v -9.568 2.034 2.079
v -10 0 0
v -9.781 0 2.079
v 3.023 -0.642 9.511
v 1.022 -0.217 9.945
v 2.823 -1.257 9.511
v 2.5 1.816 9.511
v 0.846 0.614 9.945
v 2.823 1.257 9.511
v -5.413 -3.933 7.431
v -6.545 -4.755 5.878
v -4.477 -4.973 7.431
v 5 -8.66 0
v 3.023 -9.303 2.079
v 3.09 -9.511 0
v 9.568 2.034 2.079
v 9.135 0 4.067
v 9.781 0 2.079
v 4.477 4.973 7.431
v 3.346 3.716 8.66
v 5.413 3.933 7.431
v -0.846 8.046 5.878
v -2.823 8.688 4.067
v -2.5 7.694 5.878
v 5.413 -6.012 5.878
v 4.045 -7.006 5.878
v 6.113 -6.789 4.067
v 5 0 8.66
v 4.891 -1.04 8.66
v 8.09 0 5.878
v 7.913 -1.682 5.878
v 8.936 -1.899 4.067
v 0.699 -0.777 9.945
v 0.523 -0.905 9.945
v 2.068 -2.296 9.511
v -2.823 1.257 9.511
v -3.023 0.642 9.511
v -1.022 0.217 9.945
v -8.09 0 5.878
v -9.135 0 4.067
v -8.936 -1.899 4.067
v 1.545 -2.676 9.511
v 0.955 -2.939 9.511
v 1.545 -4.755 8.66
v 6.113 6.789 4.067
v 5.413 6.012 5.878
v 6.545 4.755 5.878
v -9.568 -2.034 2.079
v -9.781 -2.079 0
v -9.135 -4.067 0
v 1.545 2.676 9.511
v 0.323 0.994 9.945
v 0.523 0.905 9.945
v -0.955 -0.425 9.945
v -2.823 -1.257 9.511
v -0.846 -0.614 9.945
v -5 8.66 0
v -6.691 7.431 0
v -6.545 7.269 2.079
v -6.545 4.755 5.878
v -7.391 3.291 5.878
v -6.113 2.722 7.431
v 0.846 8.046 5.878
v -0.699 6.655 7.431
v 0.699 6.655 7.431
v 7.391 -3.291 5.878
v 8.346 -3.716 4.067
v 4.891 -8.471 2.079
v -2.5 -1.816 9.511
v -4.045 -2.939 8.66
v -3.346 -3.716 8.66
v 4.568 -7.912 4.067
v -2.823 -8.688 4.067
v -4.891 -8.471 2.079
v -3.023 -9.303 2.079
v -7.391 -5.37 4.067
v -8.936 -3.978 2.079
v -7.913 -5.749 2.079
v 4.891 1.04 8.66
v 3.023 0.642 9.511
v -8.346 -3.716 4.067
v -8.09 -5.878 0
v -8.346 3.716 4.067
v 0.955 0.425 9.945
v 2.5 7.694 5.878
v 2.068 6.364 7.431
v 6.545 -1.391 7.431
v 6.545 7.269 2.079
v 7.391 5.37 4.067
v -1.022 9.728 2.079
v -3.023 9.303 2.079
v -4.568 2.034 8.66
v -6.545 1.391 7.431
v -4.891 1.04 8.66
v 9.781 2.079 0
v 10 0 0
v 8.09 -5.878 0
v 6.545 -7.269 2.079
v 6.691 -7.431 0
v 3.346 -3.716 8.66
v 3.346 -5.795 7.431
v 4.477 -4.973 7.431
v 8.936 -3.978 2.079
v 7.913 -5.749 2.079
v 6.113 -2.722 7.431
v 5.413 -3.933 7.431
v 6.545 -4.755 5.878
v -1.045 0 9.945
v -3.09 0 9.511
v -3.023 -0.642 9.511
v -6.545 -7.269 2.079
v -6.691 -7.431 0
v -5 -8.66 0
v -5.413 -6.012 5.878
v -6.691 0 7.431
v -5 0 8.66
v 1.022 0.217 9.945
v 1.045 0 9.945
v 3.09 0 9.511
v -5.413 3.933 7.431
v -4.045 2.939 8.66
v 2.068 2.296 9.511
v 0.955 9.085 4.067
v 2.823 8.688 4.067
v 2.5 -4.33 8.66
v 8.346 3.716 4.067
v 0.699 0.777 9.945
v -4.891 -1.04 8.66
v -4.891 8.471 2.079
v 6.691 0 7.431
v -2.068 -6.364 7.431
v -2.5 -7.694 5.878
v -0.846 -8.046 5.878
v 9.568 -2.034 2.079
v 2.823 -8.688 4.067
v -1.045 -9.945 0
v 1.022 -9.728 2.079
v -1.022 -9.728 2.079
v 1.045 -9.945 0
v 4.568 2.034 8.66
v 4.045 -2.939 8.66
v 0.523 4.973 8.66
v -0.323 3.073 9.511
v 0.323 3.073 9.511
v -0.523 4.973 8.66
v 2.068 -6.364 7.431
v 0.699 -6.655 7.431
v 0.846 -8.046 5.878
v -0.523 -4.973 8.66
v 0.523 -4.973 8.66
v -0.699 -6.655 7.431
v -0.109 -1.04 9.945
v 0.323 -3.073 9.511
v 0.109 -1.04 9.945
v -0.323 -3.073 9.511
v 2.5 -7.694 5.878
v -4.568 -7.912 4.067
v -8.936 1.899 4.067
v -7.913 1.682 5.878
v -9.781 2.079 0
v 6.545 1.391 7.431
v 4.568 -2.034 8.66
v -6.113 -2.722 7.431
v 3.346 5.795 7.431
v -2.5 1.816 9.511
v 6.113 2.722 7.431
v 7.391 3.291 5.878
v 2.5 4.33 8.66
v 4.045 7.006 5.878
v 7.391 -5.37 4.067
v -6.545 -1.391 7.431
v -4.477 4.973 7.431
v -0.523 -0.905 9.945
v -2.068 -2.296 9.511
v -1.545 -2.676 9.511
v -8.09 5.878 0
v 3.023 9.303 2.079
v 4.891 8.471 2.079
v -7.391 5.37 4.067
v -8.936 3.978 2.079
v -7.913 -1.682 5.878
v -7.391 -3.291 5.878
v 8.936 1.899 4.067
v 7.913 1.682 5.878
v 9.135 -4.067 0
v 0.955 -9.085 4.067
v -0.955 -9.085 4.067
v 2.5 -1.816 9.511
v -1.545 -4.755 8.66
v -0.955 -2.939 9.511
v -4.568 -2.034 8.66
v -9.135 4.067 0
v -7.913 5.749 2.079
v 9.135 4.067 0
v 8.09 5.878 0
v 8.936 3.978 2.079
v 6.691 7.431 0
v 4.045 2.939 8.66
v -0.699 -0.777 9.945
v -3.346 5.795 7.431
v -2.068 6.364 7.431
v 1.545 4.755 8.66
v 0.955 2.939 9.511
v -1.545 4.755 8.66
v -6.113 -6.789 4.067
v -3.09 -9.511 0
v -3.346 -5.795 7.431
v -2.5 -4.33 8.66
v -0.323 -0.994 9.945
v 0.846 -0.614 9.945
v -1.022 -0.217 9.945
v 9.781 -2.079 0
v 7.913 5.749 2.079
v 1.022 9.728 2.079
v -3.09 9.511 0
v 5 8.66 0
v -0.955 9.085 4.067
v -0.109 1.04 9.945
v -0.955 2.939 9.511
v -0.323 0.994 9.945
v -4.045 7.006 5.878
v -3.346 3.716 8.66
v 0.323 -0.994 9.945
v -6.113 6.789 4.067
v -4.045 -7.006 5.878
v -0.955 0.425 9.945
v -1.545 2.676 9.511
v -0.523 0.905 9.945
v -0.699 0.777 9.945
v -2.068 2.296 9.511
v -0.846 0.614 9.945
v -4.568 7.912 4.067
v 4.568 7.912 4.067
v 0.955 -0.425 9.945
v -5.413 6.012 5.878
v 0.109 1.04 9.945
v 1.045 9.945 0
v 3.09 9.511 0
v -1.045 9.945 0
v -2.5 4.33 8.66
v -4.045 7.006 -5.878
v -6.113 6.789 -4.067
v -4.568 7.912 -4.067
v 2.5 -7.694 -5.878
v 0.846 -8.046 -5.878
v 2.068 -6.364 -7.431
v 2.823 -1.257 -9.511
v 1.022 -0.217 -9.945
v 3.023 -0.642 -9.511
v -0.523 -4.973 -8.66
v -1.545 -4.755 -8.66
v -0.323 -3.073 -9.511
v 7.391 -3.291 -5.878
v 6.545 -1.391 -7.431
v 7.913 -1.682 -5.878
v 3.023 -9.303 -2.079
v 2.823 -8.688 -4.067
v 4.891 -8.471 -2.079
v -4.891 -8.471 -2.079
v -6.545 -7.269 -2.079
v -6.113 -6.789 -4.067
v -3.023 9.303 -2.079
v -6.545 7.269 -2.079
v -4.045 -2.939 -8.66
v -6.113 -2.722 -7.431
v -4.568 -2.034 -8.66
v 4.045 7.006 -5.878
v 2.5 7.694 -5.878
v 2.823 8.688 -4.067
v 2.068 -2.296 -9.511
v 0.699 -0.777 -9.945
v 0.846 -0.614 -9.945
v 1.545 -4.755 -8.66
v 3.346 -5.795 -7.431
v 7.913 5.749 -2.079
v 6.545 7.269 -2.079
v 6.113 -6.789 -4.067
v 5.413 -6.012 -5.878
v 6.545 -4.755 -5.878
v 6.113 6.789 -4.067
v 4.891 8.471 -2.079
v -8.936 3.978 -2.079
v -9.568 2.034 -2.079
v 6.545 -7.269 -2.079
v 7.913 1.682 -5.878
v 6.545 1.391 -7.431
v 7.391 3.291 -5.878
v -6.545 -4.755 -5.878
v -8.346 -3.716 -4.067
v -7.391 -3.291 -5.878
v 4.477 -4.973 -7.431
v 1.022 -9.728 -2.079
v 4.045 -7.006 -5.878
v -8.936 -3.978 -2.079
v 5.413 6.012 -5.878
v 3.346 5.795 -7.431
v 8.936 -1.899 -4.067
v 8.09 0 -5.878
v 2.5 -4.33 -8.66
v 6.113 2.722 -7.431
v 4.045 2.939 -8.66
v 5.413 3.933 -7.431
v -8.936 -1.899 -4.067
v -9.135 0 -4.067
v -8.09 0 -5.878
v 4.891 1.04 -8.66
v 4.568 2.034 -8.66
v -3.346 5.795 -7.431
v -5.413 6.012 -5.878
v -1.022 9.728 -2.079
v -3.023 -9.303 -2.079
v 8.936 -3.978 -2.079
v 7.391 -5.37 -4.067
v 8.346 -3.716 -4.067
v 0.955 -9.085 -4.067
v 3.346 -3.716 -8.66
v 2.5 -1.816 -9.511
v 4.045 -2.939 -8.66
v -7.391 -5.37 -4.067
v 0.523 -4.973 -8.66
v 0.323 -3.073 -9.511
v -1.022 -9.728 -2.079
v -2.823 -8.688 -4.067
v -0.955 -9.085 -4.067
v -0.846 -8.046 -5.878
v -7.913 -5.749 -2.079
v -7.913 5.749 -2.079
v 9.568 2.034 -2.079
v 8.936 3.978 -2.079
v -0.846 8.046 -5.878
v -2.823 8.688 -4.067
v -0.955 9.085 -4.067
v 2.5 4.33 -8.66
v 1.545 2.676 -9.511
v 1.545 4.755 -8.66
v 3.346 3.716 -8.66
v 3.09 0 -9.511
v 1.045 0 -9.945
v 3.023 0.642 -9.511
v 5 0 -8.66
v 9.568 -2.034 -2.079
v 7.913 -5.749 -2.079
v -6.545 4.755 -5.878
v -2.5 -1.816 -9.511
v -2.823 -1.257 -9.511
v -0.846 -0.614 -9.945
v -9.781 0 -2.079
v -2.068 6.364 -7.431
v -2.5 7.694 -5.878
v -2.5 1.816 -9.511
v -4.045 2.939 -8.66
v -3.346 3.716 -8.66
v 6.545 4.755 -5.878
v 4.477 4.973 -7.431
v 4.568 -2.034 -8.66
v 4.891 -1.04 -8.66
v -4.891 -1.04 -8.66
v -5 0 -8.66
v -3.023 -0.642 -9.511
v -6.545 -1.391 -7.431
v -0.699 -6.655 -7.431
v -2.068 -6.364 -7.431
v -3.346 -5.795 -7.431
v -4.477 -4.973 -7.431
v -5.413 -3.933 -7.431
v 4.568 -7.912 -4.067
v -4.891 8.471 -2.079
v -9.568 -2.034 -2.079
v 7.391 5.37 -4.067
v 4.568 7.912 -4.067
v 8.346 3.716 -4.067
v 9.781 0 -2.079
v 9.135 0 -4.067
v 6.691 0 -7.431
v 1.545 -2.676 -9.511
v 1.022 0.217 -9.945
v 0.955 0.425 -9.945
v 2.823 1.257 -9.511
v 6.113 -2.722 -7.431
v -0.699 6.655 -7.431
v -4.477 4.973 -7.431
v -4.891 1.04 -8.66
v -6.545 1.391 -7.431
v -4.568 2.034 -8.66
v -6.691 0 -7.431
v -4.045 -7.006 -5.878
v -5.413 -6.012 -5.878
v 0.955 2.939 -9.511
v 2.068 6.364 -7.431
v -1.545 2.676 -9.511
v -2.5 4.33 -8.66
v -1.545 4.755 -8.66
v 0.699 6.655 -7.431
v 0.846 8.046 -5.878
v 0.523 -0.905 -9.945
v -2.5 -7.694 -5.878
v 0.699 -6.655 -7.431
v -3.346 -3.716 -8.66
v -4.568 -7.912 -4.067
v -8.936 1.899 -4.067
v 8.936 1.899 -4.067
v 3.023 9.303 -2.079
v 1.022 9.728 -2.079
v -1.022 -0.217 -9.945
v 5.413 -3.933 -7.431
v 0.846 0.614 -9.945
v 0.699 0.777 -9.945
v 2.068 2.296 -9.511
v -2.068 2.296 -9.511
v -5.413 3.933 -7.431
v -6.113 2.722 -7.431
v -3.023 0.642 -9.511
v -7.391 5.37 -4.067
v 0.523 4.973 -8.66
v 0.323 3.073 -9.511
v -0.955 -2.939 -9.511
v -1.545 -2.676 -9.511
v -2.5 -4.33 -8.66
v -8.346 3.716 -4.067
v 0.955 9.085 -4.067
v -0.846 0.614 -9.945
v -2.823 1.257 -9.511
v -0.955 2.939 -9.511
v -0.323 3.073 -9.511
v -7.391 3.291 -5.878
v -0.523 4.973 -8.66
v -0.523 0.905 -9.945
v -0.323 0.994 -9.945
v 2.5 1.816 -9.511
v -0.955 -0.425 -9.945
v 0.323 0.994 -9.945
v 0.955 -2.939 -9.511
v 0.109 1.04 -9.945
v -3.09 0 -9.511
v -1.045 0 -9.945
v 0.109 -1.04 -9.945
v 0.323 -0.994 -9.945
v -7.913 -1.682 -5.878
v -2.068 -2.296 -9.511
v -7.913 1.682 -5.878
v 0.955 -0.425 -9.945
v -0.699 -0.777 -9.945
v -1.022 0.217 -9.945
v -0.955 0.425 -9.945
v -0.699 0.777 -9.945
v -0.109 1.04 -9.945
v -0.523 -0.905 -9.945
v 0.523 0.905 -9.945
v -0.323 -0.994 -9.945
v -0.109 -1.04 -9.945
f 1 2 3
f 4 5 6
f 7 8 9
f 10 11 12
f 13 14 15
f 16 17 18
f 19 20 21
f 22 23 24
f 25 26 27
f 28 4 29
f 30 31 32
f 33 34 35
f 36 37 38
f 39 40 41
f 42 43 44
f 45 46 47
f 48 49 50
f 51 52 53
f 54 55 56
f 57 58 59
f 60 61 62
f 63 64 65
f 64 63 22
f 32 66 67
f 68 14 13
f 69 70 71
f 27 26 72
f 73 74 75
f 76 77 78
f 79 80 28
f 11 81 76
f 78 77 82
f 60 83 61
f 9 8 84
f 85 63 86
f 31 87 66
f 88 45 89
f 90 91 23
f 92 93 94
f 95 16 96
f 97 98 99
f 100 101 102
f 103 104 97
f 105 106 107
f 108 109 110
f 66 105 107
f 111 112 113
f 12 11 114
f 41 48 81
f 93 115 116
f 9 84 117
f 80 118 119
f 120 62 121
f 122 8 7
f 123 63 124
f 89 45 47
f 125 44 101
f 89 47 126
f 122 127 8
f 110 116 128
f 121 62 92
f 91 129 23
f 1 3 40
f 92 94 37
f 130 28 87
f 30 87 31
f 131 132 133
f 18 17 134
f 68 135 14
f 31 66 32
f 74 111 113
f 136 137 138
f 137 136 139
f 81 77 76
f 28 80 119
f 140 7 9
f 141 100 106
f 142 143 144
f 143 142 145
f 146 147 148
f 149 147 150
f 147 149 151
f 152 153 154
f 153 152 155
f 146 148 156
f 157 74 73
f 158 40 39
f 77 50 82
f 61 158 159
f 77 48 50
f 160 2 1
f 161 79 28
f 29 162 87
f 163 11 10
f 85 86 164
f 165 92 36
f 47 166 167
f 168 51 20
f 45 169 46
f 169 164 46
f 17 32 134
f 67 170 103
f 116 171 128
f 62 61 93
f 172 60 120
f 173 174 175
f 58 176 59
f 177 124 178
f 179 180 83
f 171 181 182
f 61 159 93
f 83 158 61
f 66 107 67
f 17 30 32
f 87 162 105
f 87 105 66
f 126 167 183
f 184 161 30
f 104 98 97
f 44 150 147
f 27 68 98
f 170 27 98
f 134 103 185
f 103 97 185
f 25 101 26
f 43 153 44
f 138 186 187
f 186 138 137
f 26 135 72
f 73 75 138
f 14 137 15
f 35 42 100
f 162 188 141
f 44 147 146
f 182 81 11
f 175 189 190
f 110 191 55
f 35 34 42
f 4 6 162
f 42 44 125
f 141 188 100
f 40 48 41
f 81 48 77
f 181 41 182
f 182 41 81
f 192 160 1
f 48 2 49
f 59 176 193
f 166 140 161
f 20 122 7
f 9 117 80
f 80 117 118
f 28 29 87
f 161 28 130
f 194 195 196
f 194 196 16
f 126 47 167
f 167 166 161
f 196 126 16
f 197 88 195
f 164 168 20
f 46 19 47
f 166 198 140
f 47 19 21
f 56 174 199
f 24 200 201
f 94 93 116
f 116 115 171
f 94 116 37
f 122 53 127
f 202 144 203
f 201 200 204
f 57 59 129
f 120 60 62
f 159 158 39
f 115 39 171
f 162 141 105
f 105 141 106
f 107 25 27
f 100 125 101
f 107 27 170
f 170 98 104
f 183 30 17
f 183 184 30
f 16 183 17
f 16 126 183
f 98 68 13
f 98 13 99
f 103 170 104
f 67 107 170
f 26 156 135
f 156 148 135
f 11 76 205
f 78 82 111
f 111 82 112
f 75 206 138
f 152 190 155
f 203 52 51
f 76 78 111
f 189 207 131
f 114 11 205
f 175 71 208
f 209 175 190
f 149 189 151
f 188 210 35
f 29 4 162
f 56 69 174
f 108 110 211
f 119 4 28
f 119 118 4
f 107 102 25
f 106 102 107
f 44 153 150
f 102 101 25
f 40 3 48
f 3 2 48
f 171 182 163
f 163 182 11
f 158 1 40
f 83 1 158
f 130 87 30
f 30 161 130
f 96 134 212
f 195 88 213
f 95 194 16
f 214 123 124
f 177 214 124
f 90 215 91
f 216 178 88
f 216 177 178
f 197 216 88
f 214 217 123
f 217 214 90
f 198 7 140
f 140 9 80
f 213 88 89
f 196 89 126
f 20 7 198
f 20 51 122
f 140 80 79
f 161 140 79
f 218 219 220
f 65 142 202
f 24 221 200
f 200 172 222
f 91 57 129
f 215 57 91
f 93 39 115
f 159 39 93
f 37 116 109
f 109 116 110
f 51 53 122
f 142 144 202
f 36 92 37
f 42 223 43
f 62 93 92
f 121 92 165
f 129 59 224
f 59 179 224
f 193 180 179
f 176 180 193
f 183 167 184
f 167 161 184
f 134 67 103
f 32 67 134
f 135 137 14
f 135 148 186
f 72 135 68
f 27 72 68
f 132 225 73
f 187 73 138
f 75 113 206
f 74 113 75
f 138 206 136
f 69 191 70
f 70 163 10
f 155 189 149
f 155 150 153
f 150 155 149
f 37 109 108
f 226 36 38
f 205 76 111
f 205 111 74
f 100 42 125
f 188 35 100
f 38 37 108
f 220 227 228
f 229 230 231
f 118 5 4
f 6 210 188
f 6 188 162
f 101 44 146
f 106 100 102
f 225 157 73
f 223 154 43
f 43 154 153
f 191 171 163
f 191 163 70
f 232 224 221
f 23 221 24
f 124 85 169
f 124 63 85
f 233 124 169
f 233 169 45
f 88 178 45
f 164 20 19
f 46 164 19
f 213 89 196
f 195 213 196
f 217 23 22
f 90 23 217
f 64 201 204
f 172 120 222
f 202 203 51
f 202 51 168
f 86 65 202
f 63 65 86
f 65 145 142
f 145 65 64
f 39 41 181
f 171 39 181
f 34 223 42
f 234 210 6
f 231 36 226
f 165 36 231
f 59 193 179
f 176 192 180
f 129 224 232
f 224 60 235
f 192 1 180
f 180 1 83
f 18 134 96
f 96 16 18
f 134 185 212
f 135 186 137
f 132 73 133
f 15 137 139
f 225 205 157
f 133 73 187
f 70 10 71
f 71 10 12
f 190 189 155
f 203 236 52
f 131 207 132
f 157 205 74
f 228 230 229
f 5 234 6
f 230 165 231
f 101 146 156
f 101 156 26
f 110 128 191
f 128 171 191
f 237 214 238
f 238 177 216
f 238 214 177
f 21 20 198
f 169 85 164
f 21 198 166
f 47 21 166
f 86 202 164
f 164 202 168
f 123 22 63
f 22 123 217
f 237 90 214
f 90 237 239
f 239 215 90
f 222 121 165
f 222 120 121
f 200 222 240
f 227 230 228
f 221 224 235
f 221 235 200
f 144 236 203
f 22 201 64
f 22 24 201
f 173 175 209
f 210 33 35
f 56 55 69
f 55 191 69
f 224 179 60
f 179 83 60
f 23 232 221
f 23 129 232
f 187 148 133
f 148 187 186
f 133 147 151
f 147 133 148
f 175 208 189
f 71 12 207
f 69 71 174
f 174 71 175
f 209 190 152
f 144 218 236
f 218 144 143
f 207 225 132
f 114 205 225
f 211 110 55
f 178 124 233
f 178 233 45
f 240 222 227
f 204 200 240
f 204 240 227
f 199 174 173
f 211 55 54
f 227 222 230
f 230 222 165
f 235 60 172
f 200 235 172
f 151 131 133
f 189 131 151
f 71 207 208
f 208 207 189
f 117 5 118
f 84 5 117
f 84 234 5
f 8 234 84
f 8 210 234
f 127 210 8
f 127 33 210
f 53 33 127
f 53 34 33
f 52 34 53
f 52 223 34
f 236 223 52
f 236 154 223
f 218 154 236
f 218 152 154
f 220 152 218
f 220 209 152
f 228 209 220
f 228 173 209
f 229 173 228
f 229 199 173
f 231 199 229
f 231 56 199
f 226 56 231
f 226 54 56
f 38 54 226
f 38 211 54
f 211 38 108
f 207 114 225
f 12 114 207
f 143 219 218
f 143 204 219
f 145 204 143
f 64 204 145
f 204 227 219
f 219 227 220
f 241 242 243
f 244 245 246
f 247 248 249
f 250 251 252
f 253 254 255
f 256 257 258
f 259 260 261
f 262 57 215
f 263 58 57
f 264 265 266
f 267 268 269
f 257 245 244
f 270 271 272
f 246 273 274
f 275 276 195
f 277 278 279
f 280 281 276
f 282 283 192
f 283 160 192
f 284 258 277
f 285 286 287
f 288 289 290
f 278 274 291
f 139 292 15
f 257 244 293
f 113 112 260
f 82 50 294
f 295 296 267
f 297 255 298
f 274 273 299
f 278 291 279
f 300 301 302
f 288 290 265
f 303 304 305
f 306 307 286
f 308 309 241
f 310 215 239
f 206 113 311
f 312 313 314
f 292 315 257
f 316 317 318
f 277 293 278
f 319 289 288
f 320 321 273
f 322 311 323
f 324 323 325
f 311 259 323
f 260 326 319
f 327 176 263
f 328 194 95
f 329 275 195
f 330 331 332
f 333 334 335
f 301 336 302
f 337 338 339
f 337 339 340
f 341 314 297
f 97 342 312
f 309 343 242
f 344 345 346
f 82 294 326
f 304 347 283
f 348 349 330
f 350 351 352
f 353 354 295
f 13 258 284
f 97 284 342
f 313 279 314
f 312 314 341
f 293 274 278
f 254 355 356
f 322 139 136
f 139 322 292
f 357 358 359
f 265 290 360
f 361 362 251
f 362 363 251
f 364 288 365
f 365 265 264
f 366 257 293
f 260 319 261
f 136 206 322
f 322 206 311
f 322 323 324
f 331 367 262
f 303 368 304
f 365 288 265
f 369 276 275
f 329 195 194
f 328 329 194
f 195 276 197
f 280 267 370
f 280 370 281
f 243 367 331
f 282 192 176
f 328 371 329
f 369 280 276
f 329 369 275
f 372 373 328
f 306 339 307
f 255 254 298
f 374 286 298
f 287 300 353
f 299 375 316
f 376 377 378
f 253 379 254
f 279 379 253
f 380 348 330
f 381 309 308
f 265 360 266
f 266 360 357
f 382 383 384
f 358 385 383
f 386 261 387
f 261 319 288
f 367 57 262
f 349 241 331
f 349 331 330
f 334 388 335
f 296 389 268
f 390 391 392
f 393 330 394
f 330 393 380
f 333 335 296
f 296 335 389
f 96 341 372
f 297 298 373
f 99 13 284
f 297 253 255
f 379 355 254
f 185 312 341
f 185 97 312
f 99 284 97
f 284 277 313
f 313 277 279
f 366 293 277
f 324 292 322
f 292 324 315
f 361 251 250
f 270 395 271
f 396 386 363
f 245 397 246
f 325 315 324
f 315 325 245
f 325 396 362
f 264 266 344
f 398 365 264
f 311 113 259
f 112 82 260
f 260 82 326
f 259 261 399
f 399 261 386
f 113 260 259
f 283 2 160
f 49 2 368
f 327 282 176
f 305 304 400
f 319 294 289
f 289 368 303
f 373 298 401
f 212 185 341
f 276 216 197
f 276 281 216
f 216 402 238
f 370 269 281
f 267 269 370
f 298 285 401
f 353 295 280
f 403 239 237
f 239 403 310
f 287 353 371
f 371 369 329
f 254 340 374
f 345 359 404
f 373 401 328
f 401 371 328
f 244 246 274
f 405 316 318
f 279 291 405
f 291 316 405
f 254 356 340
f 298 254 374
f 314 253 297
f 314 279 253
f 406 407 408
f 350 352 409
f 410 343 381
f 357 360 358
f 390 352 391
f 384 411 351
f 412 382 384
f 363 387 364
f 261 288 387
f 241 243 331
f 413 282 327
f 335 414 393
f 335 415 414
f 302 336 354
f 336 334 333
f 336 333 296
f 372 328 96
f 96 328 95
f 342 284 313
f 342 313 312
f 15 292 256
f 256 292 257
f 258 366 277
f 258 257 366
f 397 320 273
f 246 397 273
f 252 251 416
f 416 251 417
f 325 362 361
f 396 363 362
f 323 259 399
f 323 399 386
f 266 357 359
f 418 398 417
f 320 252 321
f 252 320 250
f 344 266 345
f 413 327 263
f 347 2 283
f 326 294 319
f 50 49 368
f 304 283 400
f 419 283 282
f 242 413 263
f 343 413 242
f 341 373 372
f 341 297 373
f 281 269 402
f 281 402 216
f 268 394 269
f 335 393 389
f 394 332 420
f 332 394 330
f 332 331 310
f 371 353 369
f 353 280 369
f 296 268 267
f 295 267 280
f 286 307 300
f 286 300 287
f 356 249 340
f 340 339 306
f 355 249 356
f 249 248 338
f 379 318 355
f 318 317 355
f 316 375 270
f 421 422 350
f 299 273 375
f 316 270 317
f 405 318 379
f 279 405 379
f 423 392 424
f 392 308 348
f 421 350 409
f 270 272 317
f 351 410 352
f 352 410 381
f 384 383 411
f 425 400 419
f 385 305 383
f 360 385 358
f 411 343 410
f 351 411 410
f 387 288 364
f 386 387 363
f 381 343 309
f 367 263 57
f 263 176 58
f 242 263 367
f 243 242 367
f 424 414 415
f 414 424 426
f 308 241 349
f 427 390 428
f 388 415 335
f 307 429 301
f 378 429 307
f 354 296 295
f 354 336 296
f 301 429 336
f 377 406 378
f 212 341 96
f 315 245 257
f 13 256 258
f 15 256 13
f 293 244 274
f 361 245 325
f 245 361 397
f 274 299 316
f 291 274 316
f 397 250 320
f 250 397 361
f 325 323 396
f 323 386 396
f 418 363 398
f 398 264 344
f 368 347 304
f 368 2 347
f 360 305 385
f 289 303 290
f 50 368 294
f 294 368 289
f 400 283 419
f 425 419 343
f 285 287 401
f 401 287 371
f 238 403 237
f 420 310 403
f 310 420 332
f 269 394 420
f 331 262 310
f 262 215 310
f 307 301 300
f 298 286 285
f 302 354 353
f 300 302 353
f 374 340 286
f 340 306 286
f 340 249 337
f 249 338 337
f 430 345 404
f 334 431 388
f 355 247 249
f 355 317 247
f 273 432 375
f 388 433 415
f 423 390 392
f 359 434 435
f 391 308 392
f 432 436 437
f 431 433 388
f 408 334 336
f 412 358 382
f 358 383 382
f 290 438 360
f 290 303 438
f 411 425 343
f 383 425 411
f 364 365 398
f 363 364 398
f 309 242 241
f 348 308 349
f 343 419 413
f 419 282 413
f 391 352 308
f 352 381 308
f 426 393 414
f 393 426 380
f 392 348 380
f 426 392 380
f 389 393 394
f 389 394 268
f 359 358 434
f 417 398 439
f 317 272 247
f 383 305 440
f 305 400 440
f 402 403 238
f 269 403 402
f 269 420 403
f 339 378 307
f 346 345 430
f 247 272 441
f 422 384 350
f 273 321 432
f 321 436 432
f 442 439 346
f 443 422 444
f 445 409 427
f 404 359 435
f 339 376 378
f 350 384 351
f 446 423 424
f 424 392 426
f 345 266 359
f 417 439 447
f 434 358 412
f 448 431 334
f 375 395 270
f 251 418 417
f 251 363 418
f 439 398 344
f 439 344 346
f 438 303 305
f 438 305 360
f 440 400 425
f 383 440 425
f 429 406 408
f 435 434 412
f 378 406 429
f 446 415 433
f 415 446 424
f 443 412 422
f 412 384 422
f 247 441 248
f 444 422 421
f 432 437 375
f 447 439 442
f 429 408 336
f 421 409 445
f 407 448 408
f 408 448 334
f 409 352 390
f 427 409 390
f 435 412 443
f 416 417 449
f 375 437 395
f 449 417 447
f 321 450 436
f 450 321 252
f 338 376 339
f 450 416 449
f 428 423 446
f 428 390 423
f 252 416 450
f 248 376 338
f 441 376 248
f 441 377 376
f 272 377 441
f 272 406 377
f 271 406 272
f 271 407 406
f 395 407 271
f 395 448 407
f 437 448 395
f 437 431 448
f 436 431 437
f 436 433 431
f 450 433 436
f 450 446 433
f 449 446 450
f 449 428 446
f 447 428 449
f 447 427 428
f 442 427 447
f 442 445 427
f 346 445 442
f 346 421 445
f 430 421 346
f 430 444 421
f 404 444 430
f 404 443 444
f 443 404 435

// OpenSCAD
//
// CSG rendering issue:
// This results in a blue sphere rather than a sphere consisting of red/blue half spheres
// The reason is likely that OpenCSG doesn't track
// which positive object is the source of what depth fragment and thus lets the last rendered object win.
//
// uncomment the render() calls to generate expected test results

color([1,0,0]) translate([0,0,0]) /*render()*/ intersection() {
  sphere(10);
  translate([0,0,10]) cube([20,20,20],center=true);
}

color([0,0,1]) /*render()*/ difference() {
  sphere(10);
  translate([0,0,10]) cube([20,20,20],center=true);
}
